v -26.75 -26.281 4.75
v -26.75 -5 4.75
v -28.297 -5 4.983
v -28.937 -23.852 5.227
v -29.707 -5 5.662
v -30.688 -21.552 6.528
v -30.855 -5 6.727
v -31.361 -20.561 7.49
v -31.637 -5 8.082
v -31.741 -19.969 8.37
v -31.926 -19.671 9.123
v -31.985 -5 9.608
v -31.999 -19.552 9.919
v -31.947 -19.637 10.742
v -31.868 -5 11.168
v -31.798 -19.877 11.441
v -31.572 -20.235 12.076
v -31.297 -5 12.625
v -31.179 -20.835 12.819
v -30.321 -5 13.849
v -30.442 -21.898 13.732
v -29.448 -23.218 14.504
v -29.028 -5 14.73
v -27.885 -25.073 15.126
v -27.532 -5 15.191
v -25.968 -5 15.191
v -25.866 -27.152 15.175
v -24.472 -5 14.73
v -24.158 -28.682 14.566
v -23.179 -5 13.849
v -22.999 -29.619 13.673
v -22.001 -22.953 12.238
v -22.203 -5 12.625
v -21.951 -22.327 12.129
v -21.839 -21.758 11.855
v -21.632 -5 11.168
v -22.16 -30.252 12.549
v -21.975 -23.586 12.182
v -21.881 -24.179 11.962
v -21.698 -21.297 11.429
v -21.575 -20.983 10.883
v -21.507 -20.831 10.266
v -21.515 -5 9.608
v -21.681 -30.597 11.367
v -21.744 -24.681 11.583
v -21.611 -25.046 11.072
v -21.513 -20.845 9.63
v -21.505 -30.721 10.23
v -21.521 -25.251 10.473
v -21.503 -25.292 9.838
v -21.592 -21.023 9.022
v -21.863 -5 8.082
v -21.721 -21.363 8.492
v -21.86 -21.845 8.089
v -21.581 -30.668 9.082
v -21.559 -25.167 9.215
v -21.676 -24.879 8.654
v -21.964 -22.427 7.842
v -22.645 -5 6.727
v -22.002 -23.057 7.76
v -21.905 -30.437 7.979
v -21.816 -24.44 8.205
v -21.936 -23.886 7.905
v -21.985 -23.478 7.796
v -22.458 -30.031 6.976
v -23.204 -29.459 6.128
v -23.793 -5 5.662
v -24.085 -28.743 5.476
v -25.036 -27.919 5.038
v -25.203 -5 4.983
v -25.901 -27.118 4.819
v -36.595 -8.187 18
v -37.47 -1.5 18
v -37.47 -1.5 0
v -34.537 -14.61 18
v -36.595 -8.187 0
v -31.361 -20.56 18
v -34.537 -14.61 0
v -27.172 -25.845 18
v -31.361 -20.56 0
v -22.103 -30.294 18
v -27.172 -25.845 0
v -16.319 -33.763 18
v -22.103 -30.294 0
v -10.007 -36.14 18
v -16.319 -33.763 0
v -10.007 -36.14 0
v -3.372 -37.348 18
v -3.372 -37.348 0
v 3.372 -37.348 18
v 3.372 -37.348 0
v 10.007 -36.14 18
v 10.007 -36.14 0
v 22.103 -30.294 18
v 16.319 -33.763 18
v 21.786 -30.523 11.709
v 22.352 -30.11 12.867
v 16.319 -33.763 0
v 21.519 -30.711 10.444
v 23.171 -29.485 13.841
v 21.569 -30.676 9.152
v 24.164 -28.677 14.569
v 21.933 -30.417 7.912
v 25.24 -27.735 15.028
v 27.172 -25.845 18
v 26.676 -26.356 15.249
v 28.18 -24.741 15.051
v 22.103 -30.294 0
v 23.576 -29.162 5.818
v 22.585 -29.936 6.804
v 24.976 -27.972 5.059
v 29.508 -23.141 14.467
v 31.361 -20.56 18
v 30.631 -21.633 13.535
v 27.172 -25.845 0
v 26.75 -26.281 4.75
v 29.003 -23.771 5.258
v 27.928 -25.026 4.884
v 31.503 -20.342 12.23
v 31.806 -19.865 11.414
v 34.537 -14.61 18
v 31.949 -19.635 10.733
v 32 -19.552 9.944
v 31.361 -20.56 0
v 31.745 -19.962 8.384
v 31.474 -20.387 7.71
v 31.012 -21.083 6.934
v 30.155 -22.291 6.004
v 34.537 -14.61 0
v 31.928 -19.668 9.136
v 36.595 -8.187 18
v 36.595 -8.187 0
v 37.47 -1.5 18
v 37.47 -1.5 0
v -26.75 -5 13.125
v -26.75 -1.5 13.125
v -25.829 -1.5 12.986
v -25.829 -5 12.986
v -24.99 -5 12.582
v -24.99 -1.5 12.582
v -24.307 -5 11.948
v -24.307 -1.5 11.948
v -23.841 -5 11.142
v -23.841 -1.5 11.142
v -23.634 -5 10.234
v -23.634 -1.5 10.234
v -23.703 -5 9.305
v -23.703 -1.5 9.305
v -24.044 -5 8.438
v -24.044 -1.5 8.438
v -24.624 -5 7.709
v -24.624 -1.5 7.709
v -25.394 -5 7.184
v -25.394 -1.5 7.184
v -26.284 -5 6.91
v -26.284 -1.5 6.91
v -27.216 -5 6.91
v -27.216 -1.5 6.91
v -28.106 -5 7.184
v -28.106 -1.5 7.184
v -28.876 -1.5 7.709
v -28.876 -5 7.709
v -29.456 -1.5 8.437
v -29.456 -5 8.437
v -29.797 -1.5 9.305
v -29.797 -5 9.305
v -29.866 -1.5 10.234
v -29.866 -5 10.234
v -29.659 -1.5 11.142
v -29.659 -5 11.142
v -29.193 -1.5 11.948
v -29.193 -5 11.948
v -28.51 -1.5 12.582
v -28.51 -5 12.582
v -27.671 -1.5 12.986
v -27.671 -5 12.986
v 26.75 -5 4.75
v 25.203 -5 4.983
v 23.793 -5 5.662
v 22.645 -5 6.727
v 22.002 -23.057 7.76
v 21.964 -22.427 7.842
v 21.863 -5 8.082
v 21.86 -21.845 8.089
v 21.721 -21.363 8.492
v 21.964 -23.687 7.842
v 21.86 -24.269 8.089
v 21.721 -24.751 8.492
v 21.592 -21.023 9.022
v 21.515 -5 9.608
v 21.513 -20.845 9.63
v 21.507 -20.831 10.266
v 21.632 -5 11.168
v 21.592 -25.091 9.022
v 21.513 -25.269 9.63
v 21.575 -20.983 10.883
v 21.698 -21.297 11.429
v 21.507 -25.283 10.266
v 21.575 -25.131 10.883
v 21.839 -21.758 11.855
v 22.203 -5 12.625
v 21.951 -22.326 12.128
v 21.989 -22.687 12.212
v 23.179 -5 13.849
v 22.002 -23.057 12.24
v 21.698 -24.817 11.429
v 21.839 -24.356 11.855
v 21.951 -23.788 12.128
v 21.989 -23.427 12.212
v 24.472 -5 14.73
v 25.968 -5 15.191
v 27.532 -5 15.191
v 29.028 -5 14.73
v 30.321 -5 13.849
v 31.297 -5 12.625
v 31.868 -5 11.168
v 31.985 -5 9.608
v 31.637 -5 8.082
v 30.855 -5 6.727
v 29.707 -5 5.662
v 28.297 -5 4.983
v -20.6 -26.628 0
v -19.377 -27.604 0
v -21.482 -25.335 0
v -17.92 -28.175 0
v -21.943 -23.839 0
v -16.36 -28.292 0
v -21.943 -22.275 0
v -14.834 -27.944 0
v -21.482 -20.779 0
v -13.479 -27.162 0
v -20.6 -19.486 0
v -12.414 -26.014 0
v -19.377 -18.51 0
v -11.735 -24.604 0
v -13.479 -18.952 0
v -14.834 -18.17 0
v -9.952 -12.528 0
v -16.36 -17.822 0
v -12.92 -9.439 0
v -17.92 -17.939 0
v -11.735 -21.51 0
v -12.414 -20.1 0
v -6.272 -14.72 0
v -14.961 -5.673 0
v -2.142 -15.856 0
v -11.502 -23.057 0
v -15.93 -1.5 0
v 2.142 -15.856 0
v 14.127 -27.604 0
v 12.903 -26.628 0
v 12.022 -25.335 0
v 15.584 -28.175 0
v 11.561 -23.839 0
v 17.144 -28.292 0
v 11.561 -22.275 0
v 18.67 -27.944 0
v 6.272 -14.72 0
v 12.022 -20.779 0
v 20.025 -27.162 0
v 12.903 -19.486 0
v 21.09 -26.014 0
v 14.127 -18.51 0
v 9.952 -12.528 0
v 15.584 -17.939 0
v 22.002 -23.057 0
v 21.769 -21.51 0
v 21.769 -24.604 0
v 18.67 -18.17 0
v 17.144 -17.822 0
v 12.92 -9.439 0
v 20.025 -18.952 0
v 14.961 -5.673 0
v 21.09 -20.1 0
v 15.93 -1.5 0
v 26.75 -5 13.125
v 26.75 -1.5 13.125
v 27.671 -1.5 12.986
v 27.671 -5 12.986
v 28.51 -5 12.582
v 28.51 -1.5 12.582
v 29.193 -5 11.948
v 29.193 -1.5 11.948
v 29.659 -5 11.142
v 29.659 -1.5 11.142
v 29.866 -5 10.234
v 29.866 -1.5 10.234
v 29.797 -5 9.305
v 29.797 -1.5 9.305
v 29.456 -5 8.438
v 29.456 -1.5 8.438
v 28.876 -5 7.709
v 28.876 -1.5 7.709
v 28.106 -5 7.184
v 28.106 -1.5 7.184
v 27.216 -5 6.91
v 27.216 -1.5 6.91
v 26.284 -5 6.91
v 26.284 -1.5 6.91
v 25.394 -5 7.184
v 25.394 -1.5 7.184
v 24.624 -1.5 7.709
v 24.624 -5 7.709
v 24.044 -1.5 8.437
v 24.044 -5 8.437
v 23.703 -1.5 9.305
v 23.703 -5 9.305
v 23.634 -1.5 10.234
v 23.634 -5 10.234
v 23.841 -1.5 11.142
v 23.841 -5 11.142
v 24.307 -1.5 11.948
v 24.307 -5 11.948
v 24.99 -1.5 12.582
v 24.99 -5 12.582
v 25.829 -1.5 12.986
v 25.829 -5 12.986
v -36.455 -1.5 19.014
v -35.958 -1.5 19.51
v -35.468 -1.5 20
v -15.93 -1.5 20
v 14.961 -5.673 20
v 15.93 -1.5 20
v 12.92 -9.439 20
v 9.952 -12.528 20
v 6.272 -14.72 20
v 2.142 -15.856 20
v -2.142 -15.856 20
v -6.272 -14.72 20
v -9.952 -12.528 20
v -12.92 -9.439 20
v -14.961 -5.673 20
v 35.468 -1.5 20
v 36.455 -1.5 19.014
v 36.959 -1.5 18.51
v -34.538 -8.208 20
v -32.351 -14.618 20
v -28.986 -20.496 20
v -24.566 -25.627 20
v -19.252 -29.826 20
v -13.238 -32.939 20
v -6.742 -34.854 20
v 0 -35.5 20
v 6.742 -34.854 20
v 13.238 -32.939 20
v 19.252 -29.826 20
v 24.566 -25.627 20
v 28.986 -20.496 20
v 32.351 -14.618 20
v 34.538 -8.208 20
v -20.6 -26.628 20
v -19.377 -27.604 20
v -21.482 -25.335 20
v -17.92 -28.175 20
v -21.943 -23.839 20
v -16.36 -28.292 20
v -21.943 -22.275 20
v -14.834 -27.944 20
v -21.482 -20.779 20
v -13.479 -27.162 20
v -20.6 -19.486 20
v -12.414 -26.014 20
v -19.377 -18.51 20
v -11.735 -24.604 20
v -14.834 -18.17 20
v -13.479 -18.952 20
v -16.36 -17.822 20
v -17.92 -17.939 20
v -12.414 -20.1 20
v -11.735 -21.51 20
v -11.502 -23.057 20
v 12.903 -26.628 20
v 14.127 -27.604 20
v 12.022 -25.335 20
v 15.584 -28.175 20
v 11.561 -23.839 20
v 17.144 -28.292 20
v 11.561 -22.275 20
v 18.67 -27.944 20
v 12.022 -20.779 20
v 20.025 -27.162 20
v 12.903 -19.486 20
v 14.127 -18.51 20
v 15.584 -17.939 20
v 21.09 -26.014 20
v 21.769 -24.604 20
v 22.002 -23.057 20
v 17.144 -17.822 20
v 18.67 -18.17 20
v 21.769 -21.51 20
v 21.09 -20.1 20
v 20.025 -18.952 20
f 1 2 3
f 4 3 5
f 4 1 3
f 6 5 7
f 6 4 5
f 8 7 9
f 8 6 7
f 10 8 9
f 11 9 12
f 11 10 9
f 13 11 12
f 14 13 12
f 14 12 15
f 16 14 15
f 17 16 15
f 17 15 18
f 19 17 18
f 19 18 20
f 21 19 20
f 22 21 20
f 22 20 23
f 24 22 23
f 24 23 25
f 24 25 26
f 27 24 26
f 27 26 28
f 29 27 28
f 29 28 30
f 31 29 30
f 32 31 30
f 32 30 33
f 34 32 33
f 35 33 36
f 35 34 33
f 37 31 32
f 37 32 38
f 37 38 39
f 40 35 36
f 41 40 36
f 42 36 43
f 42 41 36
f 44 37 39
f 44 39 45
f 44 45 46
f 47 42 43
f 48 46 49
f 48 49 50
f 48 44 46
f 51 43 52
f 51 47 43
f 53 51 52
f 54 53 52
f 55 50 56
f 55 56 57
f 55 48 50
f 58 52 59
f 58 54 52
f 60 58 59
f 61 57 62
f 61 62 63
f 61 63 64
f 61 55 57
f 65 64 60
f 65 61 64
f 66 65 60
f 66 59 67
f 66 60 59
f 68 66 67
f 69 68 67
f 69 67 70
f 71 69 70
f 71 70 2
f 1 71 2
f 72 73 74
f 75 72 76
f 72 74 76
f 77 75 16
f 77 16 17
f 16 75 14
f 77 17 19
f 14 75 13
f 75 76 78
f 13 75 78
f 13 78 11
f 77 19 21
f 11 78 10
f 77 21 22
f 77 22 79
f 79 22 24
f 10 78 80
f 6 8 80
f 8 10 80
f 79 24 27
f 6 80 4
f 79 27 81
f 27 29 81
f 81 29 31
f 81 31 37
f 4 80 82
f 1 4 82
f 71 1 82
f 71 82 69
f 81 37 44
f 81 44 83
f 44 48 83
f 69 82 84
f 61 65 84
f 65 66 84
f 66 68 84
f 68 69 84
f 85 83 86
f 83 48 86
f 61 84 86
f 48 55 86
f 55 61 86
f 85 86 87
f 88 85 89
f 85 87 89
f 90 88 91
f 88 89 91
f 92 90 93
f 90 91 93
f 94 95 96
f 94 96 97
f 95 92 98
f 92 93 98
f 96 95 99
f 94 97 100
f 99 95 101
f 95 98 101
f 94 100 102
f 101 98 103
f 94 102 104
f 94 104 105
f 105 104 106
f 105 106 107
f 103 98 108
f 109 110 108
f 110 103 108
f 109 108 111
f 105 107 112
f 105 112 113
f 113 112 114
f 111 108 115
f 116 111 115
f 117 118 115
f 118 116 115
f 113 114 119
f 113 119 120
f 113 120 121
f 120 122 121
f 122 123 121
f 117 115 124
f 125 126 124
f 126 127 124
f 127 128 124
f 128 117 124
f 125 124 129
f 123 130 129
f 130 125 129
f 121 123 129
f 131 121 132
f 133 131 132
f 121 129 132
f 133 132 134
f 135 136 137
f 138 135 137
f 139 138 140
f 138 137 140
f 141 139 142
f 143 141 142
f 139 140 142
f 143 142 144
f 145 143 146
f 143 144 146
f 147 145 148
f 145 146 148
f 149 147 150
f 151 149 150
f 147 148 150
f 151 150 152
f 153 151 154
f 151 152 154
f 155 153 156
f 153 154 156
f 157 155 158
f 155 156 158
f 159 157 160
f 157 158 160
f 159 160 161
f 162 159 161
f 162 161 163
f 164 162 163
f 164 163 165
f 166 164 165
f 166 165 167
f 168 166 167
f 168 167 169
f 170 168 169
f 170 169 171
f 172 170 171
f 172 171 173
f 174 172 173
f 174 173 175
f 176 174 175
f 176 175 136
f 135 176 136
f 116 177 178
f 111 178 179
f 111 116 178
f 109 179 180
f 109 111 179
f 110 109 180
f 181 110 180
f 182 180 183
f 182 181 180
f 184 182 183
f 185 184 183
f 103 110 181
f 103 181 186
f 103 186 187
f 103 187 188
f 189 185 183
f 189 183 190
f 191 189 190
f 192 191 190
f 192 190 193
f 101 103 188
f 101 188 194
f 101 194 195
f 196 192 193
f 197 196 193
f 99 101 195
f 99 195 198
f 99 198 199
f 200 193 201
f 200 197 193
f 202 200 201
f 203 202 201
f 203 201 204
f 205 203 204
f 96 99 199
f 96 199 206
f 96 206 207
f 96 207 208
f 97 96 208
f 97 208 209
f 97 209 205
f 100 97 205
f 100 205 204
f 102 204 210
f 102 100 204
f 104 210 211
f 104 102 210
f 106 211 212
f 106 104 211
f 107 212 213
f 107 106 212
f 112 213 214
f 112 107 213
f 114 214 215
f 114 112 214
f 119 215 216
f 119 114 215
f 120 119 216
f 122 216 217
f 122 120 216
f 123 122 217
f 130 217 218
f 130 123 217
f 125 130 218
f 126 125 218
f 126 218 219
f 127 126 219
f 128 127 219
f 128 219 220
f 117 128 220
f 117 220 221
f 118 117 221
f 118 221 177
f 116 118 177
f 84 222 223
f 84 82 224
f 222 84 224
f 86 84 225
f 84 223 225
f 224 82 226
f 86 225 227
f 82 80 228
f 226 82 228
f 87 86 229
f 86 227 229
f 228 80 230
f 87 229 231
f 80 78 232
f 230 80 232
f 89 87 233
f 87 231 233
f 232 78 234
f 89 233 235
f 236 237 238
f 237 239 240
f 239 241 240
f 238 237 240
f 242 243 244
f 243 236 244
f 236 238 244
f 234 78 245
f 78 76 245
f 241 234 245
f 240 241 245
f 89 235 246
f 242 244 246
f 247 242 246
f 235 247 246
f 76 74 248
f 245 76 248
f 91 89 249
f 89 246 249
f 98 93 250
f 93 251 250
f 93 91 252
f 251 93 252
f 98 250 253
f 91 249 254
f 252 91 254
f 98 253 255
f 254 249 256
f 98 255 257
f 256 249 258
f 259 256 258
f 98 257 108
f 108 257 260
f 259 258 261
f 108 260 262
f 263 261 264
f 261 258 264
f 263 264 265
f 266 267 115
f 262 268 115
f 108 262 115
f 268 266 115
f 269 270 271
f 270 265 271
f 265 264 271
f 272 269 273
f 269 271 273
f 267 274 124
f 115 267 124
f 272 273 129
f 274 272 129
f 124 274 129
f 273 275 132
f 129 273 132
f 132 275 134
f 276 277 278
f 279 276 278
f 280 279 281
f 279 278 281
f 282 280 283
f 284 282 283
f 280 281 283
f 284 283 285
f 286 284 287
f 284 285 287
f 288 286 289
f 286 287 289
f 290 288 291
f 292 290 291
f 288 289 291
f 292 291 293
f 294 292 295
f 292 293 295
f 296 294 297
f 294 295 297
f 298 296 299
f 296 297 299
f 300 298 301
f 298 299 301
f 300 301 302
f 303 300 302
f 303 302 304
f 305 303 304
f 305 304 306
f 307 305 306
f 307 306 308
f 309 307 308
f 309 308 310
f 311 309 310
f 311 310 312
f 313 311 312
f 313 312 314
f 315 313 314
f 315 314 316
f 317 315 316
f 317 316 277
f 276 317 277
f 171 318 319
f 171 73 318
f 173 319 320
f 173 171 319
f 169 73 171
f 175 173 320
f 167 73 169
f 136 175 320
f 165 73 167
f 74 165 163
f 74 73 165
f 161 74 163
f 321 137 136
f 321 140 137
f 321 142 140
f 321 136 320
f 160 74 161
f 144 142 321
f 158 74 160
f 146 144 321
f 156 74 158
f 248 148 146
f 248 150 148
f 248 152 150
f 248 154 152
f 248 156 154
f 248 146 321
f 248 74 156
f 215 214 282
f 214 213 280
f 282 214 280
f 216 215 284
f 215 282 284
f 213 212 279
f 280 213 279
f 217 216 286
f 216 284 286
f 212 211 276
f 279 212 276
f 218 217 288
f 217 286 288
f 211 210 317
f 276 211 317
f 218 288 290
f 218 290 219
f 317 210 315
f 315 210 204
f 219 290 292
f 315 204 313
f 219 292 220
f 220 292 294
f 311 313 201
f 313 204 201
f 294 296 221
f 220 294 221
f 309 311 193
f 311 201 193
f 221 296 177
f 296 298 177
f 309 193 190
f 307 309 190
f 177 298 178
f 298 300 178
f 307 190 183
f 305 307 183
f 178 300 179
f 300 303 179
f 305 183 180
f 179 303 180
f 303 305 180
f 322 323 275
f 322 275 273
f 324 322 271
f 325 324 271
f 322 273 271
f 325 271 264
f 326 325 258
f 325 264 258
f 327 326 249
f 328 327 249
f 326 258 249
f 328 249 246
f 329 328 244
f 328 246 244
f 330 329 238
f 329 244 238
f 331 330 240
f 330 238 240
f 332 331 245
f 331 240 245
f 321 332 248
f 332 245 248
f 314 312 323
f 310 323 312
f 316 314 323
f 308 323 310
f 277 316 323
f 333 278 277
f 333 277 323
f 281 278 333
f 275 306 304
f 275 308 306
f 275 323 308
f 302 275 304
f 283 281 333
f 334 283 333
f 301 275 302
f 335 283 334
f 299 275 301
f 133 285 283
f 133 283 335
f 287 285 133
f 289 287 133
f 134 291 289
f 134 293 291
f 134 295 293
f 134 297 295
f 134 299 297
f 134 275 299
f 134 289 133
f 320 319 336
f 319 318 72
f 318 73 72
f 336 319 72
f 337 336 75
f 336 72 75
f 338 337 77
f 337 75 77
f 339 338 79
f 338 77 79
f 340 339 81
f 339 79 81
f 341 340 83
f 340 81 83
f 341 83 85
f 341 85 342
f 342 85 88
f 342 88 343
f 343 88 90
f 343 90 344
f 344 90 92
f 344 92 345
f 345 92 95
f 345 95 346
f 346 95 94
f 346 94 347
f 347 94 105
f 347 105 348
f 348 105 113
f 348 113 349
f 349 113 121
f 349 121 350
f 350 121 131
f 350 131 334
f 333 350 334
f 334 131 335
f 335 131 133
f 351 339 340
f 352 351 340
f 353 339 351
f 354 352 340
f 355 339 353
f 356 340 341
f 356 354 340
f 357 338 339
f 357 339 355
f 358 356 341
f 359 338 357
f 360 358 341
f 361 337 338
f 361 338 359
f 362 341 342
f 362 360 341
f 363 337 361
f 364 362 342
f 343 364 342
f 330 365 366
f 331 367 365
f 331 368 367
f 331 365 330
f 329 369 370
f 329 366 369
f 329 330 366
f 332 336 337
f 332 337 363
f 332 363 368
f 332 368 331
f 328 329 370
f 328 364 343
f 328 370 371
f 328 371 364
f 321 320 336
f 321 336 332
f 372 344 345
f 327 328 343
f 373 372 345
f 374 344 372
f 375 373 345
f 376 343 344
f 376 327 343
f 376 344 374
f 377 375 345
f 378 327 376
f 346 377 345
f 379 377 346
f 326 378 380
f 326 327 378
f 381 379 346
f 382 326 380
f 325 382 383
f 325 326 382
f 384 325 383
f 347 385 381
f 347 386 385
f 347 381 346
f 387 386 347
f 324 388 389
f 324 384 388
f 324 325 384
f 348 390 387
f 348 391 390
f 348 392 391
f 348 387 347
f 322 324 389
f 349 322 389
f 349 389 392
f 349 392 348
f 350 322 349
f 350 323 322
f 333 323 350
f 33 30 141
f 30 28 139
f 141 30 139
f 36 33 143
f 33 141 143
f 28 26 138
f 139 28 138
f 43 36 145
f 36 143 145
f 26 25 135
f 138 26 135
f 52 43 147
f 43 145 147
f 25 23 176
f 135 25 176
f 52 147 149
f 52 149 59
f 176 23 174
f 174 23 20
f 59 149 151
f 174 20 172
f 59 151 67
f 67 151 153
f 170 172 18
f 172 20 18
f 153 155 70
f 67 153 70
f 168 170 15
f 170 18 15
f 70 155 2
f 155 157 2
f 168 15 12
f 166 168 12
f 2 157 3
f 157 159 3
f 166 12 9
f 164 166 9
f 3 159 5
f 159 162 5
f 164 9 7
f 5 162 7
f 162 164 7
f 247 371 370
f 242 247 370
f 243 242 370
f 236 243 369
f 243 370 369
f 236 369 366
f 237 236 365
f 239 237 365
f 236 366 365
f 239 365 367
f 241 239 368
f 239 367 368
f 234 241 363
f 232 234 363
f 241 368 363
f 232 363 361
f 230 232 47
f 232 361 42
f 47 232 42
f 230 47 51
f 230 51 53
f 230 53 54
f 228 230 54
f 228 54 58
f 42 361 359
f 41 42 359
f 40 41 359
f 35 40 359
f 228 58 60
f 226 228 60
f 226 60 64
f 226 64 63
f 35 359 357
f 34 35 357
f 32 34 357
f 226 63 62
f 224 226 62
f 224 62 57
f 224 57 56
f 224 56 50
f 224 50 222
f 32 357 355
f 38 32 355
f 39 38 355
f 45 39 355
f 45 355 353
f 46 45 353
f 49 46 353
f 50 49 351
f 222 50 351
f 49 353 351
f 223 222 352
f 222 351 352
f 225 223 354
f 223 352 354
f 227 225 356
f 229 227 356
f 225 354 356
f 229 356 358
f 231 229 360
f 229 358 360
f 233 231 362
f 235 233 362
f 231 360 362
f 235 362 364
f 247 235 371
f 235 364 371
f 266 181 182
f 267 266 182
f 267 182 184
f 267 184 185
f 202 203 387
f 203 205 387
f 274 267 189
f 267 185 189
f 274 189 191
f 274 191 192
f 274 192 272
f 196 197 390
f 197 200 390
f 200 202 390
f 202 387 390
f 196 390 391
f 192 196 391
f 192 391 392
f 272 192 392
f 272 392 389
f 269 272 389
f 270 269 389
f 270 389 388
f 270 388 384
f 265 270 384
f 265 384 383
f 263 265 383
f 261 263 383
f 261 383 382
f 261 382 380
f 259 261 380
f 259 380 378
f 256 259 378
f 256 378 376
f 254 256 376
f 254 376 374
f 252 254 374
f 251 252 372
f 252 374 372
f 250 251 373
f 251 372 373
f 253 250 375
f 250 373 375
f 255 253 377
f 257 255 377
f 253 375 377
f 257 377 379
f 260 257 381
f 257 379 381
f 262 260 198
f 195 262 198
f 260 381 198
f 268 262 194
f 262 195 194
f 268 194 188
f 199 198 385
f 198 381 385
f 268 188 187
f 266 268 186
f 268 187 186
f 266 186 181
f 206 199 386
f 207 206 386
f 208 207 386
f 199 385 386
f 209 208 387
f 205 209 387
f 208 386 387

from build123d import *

# Parameters (mm, degrees)
BOSS_EXTRUDE1_DEPTH = 20
SKETCH2_R           = 5.25
CUT_EXTRUDE1_DEPTH  = 30
SKETCH3_R           = 3.125
CUT_EXTRUDE2_DEPTH  = 30
SKETCH4_R           = 5.25
CUT_EXTRUDE3_DEPTH  = 33
CHAMFER1_SIZE       = 2
SKETCH5_W           = 75
SKETCH5_H           = 20
CUT_EXTRUDE4_DEPTH  = 1.5


with BuildPart() as part:
    # Sketch1 → Boss-Extrude1 (new body)
    with BuildSketch(Plane.XY):
        with BuildLine():
            Line((-16, 0), (-37.5, 0))
            ThreePointArc((-37.5, 0), (0, -37.5), (37.5, 0))
            Line((37.5, 0), (16, 0))
            ThreePointArc((16, 0), (0, -16), (-16, 0))
        make_face()
    extrude(amount=BOSS_EXTRUDE1_DEPTH)

    # Sketch2 → Cut-Extrude1 (cut)
    with BuildSketch(Plane.XY.offset(20)):
        with Locations((-16.75187969, -23.05698434)):
            Circle(SKETCH2_R)
        with Locations((16.75187969, -23.05698434)):
            Circle(SKETCH2_R)
    extrude(amount=-CUT_EXTRUDE1_DEPTH, mode=Mode.SUBTRACT)

    # Sketch3 → Cut-Extrude2 (cut)
    with BuildSketch(Plane(origin=(0, 0, 0), x_dir=(1, 0, 0), z_dir=(0, 1, 0))):
        with Locations(Location((-26.75, -10, 0), (0, 0, 270))):
            Circle(SKETCH3_R)
        with Locations(Location((26.75, -10, 0), (0, 0, 270))):
            Circle(SKETCH3_R)
    extrude(amount=-CUT_EXTRUDE2_DEPTH, mode=Mode.SUBTRACT)

    # Sketch4 → Cut-Extrude3 (cut)
    with BuildSketch(Plane(origin=(0, -38, 0), x_dir=(1, 0, 0), z_dir=(0, 1, 0))):
        with Locations(Location((-26.75, -10, 0), (0, 0, 90))):
            Circle(SKETCH4_R)
        with Locations(Location((26.75, -10, 0), (0, 0, 90))):
            Circle(SKETCH4_R)
    extrude(amount=CUT_EXTRUDE3_DEPTH, mode=Mode.SUBTRACT)

    # Chamfer1
    chamfer1_edges = [part.edges().sort_by_distance(p)[0] for p in [
        (0, -37.5, 20),
    ]]
    chamfer(chamfer1_edges, length=CHAMFER1_SIZE)

    # Sketch5 → Cut-Extrude4 (cut)
    with BuildSketch(Plane(origin=(0, 0, 0), x_dir=(1, 0, 0), z_dir=(0, 1, 0))):
        with Locations((0, -10)):
            Rectangle(SKETCH5_W, SKETCH5_H)
    extrude(amount=-CUT_EXTRUDE4_DEPTH, mode=Mode.SUBTRACT)


solid = part.part
